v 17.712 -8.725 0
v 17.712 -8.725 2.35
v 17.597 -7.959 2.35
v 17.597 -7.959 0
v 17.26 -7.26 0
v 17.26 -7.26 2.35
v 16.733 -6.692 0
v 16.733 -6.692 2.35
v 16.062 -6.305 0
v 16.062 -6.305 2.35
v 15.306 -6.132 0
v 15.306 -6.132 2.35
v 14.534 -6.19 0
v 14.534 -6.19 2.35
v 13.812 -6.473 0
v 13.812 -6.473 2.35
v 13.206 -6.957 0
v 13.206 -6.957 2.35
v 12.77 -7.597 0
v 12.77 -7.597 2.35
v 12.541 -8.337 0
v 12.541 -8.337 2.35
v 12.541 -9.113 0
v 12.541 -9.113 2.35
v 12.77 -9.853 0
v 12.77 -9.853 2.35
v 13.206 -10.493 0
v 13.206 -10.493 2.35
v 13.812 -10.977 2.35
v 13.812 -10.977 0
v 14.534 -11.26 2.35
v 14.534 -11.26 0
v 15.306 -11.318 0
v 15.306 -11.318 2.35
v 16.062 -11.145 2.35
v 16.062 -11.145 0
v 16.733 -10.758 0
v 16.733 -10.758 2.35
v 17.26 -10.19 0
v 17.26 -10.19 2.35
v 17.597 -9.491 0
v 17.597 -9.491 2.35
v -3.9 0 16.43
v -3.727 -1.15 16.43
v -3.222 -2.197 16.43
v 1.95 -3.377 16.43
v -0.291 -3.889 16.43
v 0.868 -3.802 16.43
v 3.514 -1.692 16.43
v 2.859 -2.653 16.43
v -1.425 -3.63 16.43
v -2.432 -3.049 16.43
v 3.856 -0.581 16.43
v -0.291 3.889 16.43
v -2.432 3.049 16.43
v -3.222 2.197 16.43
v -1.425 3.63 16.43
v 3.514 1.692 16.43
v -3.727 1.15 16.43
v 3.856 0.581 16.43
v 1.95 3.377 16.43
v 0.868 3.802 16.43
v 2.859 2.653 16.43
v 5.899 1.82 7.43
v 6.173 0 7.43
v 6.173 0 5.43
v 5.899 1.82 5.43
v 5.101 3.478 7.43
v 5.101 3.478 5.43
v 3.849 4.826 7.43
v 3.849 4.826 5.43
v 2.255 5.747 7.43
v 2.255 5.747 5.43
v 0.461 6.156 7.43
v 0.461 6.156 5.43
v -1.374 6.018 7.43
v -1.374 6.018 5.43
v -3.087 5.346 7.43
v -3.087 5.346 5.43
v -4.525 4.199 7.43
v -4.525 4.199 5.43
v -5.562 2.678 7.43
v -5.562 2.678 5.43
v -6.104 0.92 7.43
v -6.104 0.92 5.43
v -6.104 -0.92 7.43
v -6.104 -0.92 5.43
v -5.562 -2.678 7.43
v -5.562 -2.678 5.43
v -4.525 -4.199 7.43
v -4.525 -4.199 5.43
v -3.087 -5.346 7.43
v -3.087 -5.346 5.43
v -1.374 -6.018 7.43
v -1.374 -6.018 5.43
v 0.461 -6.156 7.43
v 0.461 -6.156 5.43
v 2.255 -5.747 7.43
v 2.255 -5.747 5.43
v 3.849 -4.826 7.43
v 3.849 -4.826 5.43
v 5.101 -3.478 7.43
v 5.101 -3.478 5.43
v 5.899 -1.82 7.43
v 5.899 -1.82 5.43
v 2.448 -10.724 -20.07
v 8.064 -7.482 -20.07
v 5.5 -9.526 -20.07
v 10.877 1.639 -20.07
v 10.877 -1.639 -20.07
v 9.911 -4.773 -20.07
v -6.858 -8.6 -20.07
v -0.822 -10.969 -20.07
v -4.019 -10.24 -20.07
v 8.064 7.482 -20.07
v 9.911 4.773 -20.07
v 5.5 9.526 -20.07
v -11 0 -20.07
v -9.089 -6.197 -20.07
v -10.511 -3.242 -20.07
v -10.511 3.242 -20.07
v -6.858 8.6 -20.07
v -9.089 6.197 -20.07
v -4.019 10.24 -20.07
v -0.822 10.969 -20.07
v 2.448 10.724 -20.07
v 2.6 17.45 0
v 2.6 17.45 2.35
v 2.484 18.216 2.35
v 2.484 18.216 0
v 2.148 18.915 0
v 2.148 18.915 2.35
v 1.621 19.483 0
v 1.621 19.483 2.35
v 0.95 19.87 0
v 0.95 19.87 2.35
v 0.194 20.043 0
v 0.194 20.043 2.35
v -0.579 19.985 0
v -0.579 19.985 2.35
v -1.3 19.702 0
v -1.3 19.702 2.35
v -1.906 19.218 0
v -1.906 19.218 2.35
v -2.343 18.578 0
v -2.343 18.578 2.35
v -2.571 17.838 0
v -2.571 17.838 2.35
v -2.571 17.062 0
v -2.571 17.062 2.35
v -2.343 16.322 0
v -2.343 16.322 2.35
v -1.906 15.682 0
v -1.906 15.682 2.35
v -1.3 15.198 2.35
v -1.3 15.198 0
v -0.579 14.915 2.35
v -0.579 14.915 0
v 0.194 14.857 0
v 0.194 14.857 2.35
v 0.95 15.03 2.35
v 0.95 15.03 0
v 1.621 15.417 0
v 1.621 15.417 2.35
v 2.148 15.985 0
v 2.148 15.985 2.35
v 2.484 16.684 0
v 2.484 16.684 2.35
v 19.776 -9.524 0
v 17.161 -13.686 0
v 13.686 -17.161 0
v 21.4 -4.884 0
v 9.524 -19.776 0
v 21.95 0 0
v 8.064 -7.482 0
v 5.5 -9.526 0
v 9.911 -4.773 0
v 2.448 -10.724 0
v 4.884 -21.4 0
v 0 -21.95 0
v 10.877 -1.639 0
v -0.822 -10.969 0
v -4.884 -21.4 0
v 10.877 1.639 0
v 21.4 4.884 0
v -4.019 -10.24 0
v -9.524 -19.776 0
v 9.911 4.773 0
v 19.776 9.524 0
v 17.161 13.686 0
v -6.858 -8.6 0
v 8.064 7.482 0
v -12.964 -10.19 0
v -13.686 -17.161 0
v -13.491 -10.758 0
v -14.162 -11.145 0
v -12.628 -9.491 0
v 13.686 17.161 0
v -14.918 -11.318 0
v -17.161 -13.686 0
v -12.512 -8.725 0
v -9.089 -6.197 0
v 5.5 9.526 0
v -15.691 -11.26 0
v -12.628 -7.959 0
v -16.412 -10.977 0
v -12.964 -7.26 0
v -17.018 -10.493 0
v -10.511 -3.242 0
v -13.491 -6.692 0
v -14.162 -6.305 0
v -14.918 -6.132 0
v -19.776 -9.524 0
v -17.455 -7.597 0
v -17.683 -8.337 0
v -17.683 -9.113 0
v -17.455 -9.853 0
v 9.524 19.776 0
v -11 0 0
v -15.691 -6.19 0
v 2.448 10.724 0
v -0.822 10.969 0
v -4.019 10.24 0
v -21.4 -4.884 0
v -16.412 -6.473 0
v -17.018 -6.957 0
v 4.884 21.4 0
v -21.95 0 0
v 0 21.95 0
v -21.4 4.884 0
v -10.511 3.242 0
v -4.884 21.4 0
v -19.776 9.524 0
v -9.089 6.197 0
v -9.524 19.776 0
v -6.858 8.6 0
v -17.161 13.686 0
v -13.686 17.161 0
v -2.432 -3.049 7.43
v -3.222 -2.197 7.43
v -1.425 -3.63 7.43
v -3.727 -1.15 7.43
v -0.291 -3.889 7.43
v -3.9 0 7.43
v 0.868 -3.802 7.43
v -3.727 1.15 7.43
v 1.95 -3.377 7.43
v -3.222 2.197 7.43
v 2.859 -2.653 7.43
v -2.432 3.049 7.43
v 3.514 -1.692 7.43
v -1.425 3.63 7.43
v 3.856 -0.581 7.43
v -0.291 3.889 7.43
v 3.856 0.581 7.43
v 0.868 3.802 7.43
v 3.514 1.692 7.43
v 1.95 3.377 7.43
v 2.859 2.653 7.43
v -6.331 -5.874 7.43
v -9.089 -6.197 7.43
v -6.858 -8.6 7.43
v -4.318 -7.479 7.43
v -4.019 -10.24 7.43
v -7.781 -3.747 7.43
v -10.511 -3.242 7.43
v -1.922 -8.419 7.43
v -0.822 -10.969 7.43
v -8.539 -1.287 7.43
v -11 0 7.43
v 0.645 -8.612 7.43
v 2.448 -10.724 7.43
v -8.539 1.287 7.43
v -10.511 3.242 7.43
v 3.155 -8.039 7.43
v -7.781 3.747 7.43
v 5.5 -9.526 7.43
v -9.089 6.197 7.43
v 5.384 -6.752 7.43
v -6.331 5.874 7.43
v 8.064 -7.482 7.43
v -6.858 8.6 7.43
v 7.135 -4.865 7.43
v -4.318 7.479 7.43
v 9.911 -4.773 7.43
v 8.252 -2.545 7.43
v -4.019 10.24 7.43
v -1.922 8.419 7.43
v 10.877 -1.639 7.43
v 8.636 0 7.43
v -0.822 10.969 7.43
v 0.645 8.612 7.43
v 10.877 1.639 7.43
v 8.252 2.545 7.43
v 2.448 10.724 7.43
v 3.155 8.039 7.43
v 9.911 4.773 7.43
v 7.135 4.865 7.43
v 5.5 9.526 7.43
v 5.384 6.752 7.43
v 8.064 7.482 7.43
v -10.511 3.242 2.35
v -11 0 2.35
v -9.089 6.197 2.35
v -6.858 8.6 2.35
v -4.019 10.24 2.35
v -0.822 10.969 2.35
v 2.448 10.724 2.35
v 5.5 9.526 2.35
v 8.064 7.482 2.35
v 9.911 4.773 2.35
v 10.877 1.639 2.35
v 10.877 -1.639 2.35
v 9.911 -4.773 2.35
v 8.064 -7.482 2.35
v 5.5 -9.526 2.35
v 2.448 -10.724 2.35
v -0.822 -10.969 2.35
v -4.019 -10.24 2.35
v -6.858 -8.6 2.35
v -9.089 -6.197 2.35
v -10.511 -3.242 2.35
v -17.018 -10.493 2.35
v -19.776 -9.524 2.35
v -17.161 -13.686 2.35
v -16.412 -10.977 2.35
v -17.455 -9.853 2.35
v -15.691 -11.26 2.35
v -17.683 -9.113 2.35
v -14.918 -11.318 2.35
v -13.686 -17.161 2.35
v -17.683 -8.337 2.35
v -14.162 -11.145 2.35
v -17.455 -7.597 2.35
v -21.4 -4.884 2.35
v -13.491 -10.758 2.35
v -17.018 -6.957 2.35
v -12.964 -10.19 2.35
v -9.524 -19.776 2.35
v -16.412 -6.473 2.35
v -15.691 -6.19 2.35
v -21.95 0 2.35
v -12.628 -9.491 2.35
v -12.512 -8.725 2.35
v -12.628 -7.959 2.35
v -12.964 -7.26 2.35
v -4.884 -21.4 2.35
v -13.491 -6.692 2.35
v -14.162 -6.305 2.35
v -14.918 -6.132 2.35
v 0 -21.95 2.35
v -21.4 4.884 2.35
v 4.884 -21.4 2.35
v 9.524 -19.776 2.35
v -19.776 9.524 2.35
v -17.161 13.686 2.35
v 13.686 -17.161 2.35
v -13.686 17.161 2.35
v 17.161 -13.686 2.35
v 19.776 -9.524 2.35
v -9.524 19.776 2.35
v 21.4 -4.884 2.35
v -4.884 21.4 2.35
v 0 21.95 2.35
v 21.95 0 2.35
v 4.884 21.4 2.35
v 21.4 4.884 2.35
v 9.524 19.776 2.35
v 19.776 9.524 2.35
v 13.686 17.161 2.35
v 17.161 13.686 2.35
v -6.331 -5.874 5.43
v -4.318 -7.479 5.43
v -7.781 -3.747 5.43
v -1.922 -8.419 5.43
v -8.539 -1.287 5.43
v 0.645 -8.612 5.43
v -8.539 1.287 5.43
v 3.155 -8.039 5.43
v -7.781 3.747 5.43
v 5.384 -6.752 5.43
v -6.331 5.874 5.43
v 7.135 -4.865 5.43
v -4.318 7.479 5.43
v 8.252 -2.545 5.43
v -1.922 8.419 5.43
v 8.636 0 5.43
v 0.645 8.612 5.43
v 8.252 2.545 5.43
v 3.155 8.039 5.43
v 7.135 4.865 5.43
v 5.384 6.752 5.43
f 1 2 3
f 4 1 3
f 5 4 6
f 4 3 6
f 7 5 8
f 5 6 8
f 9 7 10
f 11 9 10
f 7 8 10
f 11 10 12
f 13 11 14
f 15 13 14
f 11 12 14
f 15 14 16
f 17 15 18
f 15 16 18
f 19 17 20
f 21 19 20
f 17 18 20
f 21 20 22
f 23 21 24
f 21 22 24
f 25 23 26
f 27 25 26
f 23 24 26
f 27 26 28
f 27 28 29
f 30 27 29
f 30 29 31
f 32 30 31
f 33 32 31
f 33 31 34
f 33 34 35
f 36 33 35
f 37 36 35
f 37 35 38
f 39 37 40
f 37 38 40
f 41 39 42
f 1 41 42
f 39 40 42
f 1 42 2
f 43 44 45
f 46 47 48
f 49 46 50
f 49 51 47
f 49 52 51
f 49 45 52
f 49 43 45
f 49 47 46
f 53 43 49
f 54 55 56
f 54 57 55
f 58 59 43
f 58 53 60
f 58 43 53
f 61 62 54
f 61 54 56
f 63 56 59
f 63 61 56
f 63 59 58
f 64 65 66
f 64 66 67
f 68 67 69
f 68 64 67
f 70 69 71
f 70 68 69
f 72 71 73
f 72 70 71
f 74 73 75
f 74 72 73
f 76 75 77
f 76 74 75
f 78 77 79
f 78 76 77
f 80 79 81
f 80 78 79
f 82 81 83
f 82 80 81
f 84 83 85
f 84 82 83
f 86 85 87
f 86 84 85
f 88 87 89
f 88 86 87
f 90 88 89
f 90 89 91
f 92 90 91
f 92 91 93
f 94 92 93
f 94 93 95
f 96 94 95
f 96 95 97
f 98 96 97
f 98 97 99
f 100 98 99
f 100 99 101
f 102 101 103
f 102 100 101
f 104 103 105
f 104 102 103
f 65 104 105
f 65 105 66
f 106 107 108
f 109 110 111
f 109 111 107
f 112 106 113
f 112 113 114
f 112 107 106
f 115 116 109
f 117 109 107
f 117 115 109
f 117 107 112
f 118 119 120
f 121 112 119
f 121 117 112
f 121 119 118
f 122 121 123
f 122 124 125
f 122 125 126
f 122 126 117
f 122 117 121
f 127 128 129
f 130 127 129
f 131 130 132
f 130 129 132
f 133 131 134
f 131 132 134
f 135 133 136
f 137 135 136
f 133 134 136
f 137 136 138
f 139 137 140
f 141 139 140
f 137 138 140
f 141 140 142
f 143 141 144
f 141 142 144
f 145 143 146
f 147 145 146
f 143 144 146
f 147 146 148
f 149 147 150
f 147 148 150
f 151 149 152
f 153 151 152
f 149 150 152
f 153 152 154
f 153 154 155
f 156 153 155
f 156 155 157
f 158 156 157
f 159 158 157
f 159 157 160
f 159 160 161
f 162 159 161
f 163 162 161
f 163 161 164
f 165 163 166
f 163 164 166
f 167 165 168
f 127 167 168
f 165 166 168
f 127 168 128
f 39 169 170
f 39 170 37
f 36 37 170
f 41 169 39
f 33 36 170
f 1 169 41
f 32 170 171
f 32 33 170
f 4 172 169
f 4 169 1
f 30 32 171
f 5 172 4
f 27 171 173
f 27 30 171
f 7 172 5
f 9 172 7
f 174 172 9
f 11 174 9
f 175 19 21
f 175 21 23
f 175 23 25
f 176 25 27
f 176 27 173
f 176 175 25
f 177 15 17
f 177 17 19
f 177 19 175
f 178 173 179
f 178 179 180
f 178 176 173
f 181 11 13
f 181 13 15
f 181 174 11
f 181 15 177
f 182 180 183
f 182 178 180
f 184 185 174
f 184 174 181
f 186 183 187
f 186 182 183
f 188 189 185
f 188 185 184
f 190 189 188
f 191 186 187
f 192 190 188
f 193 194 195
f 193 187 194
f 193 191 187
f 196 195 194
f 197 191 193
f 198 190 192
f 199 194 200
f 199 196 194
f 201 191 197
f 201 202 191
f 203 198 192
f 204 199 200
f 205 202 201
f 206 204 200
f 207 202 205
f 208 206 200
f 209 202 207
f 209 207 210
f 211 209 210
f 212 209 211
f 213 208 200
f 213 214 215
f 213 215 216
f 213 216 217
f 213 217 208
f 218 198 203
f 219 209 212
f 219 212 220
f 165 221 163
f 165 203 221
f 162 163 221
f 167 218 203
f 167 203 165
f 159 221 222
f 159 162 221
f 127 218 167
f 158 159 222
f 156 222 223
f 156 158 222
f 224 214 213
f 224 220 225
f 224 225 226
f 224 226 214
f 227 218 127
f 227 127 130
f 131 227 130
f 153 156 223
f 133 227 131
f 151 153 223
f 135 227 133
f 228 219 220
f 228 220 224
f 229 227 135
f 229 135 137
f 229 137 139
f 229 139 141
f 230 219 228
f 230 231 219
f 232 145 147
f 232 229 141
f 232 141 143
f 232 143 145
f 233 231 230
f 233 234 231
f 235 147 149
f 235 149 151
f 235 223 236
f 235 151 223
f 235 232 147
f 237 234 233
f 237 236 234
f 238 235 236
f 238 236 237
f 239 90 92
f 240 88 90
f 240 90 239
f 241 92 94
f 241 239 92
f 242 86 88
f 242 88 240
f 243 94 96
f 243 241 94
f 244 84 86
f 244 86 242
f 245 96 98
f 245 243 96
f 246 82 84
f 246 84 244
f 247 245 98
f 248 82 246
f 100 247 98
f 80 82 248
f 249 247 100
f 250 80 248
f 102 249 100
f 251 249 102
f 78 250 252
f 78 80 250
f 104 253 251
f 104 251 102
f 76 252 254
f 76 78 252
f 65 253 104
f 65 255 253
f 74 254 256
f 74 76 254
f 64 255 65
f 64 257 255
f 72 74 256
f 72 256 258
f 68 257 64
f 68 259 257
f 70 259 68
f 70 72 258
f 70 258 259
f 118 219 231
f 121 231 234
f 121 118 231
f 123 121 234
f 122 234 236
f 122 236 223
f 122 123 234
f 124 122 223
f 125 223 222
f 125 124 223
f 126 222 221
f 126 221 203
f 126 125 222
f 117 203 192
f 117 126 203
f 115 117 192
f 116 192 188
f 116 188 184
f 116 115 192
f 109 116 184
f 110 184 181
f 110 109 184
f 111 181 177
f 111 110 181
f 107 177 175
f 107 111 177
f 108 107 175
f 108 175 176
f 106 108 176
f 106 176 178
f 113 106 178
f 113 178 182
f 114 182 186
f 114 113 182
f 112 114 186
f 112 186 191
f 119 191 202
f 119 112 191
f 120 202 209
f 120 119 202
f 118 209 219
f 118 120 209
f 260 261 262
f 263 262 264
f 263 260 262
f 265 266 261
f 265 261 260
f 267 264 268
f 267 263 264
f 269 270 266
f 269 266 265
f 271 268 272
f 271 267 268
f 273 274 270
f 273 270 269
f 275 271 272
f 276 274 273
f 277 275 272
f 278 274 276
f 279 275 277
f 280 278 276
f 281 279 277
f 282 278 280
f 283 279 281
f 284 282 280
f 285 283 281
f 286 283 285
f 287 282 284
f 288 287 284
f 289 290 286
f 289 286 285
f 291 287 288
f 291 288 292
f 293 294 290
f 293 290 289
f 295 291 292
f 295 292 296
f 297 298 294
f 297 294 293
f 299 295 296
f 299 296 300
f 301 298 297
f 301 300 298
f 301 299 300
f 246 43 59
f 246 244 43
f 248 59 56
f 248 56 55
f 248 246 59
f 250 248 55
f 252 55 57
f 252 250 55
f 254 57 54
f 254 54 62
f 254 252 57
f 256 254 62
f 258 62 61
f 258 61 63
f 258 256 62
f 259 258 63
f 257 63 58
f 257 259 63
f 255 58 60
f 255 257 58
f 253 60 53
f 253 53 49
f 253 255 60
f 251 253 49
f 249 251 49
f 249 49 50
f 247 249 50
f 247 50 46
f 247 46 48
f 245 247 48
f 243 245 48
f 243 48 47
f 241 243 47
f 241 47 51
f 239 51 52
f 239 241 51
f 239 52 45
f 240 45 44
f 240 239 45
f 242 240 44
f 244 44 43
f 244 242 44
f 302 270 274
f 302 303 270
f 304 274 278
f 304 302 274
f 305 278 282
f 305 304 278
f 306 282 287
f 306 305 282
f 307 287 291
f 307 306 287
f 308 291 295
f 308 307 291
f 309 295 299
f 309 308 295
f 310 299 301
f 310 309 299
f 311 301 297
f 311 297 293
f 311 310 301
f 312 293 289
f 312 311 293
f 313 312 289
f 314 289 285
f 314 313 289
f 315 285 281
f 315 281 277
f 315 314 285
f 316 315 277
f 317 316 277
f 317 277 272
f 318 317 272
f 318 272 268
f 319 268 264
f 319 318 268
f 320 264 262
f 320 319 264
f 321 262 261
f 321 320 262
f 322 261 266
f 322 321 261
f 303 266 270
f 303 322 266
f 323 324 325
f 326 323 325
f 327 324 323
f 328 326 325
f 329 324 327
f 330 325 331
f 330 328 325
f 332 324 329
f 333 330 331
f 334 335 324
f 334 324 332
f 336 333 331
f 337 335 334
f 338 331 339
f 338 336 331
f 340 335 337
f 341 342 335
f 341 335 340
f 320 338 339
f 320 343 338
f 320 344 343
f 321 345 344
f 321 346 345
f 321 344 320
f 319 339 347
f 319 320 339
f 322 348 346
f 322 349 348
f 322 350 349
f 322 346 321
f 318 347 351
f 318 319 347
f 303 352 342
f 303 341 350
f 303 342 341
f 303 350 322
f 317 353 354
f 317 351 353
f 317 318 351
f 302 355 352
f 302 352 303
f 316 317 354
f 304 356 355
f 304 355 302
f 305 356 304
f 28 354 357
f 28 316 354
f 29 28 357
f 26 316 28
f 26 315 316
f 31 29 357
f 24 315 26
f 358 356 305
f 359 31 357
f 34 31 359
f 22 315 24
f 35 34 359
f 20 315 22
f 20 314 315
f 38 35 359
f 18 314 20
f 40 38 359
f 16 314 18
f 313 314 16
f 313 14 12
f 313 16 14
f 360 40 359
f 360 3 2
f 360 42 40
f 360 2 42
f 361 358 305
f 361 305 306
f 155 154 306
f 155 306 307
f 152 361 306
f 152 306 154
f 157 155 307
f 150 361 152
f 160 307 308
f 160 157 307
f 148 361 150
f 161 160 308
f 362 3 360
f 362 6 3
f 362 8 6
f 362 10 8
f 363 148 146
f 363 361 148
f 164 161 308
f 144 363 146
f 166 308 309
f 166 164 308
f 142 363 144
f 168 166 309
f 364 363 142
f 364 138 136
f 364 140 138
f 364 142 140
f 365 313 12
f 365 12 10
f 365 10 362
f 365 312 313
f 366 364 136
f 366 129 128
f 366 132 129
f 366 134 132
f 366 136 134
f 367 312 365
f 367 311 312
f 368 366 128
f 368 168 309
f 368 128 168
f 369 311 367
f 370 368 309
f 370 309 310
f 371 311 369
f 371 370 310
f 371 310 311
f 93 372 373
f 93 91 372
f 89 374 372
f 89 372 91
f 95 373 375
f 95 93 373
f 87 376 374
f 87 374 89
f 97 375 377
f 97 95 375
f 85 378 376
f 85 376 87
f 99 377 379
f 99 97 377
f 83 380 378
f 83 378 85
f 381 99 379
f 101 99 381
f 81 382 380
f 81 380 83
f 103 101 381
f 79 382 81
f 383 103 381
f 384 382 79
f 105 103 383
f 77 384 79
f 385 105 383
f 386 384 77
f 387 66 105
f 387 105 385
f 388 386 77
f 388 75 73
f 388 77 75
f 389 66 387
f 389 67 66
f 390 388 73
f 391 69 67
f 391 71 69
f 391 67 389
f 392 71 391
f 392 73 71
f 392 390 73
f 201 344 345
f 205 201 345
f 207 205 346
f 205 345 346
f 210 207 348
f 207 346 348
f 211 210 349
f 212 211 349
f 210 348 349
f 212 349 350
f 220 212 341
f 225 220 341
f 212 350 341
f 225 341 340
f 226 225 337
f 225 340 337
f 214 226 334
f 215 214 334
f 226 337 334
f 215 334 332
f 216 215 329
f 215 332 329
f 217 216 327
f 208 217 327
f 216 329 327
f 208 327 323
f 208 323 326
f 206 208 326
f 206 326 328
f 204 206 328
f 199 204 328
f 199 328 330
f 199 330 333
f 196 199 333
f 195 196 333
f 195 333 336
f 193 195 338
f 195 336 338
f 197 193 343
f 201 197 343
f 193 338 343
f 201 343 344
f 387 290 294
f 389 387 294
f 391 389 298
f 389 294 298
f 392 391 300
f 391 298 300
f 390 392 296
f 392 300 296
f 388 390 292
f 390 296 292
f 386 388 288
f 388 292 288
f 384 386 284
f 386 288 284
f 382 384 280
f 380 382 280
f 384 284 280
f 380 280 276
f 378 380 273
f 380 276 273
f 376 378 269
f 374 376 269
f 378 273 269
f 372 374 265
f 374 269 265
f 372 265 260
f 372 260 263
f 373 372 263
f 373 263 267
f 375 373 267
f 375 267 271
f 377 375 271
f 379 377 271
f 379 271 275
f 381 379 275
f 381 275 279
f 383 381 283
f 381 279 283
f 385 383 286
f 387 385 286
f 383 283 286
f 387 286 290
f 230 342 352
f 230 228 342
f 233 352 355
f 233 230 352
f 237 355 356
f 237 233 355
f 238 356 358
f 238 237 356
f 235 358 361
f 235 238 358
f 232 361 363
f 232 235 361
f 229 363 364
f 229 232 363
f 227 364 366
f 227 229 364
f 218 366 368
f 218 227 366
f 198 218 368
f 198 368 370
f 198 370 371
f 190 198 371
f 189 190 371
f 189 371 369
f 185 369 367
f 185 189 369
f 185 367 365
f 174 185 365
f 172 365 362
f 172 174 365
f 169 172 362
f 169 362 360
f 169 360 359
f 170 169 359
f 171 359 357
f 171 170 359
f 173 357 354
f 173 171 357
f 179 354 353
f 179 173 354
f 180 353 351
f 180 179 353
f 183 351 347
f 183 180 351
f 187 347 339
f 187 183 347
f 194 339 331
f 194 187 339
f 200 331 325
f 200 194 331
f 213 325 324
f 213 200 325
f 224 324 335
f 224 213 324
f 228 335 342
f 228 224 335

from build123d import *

# Parameters (mm, degrees)
F2_R     = 2.6
F3_DEPTH = 2.35
F4_R     = 8.635865
F4_R_2   = 6.173243
F5_DEPTH = 2


with BuildPart() as f1:
    # F0 (on Front) → F1 (revolve)
    with BuildSketch(Plane.XZ):
        Polygon((-3.9, 7.43), (-11, 7.43), (-11, 2.35), (-21.95, 2.35), (-21.95, 0), (-11, 0), (-11, -20.07), (0, -20.07), (0, 16.43), (-3.9, 16.43), align=None)
    revolve(axis=Axis((0, 0, -1.82), (0, 0, -1)))

    # F2 (on face) → F3 (cut, through all)
    with BuildSketch(Plane.XY.offset(2.35)):
        with Locations((0, 17.45)):
            Circle(F2_R)
        with Locations((15.112143, -8.725)):
            Circle(F2_R)
        with Locations((-15.112143, -8.725)):
            Circle(F2_R)
    extrude(amount=-F3_DEPTH, mode=Mode.SUBTRACT)

    # F4 (on face) → F5 (cut)
    with BuildSketch(Plane.XY.offset(7.43)):
        Circle(F4_R)
        Circle(F4_R_2, mode=Mode.SUBTRACT)
    extrude(amount=-F5_DEPTH, mode=Mode.SUBTRACT)


solid = f1.part
